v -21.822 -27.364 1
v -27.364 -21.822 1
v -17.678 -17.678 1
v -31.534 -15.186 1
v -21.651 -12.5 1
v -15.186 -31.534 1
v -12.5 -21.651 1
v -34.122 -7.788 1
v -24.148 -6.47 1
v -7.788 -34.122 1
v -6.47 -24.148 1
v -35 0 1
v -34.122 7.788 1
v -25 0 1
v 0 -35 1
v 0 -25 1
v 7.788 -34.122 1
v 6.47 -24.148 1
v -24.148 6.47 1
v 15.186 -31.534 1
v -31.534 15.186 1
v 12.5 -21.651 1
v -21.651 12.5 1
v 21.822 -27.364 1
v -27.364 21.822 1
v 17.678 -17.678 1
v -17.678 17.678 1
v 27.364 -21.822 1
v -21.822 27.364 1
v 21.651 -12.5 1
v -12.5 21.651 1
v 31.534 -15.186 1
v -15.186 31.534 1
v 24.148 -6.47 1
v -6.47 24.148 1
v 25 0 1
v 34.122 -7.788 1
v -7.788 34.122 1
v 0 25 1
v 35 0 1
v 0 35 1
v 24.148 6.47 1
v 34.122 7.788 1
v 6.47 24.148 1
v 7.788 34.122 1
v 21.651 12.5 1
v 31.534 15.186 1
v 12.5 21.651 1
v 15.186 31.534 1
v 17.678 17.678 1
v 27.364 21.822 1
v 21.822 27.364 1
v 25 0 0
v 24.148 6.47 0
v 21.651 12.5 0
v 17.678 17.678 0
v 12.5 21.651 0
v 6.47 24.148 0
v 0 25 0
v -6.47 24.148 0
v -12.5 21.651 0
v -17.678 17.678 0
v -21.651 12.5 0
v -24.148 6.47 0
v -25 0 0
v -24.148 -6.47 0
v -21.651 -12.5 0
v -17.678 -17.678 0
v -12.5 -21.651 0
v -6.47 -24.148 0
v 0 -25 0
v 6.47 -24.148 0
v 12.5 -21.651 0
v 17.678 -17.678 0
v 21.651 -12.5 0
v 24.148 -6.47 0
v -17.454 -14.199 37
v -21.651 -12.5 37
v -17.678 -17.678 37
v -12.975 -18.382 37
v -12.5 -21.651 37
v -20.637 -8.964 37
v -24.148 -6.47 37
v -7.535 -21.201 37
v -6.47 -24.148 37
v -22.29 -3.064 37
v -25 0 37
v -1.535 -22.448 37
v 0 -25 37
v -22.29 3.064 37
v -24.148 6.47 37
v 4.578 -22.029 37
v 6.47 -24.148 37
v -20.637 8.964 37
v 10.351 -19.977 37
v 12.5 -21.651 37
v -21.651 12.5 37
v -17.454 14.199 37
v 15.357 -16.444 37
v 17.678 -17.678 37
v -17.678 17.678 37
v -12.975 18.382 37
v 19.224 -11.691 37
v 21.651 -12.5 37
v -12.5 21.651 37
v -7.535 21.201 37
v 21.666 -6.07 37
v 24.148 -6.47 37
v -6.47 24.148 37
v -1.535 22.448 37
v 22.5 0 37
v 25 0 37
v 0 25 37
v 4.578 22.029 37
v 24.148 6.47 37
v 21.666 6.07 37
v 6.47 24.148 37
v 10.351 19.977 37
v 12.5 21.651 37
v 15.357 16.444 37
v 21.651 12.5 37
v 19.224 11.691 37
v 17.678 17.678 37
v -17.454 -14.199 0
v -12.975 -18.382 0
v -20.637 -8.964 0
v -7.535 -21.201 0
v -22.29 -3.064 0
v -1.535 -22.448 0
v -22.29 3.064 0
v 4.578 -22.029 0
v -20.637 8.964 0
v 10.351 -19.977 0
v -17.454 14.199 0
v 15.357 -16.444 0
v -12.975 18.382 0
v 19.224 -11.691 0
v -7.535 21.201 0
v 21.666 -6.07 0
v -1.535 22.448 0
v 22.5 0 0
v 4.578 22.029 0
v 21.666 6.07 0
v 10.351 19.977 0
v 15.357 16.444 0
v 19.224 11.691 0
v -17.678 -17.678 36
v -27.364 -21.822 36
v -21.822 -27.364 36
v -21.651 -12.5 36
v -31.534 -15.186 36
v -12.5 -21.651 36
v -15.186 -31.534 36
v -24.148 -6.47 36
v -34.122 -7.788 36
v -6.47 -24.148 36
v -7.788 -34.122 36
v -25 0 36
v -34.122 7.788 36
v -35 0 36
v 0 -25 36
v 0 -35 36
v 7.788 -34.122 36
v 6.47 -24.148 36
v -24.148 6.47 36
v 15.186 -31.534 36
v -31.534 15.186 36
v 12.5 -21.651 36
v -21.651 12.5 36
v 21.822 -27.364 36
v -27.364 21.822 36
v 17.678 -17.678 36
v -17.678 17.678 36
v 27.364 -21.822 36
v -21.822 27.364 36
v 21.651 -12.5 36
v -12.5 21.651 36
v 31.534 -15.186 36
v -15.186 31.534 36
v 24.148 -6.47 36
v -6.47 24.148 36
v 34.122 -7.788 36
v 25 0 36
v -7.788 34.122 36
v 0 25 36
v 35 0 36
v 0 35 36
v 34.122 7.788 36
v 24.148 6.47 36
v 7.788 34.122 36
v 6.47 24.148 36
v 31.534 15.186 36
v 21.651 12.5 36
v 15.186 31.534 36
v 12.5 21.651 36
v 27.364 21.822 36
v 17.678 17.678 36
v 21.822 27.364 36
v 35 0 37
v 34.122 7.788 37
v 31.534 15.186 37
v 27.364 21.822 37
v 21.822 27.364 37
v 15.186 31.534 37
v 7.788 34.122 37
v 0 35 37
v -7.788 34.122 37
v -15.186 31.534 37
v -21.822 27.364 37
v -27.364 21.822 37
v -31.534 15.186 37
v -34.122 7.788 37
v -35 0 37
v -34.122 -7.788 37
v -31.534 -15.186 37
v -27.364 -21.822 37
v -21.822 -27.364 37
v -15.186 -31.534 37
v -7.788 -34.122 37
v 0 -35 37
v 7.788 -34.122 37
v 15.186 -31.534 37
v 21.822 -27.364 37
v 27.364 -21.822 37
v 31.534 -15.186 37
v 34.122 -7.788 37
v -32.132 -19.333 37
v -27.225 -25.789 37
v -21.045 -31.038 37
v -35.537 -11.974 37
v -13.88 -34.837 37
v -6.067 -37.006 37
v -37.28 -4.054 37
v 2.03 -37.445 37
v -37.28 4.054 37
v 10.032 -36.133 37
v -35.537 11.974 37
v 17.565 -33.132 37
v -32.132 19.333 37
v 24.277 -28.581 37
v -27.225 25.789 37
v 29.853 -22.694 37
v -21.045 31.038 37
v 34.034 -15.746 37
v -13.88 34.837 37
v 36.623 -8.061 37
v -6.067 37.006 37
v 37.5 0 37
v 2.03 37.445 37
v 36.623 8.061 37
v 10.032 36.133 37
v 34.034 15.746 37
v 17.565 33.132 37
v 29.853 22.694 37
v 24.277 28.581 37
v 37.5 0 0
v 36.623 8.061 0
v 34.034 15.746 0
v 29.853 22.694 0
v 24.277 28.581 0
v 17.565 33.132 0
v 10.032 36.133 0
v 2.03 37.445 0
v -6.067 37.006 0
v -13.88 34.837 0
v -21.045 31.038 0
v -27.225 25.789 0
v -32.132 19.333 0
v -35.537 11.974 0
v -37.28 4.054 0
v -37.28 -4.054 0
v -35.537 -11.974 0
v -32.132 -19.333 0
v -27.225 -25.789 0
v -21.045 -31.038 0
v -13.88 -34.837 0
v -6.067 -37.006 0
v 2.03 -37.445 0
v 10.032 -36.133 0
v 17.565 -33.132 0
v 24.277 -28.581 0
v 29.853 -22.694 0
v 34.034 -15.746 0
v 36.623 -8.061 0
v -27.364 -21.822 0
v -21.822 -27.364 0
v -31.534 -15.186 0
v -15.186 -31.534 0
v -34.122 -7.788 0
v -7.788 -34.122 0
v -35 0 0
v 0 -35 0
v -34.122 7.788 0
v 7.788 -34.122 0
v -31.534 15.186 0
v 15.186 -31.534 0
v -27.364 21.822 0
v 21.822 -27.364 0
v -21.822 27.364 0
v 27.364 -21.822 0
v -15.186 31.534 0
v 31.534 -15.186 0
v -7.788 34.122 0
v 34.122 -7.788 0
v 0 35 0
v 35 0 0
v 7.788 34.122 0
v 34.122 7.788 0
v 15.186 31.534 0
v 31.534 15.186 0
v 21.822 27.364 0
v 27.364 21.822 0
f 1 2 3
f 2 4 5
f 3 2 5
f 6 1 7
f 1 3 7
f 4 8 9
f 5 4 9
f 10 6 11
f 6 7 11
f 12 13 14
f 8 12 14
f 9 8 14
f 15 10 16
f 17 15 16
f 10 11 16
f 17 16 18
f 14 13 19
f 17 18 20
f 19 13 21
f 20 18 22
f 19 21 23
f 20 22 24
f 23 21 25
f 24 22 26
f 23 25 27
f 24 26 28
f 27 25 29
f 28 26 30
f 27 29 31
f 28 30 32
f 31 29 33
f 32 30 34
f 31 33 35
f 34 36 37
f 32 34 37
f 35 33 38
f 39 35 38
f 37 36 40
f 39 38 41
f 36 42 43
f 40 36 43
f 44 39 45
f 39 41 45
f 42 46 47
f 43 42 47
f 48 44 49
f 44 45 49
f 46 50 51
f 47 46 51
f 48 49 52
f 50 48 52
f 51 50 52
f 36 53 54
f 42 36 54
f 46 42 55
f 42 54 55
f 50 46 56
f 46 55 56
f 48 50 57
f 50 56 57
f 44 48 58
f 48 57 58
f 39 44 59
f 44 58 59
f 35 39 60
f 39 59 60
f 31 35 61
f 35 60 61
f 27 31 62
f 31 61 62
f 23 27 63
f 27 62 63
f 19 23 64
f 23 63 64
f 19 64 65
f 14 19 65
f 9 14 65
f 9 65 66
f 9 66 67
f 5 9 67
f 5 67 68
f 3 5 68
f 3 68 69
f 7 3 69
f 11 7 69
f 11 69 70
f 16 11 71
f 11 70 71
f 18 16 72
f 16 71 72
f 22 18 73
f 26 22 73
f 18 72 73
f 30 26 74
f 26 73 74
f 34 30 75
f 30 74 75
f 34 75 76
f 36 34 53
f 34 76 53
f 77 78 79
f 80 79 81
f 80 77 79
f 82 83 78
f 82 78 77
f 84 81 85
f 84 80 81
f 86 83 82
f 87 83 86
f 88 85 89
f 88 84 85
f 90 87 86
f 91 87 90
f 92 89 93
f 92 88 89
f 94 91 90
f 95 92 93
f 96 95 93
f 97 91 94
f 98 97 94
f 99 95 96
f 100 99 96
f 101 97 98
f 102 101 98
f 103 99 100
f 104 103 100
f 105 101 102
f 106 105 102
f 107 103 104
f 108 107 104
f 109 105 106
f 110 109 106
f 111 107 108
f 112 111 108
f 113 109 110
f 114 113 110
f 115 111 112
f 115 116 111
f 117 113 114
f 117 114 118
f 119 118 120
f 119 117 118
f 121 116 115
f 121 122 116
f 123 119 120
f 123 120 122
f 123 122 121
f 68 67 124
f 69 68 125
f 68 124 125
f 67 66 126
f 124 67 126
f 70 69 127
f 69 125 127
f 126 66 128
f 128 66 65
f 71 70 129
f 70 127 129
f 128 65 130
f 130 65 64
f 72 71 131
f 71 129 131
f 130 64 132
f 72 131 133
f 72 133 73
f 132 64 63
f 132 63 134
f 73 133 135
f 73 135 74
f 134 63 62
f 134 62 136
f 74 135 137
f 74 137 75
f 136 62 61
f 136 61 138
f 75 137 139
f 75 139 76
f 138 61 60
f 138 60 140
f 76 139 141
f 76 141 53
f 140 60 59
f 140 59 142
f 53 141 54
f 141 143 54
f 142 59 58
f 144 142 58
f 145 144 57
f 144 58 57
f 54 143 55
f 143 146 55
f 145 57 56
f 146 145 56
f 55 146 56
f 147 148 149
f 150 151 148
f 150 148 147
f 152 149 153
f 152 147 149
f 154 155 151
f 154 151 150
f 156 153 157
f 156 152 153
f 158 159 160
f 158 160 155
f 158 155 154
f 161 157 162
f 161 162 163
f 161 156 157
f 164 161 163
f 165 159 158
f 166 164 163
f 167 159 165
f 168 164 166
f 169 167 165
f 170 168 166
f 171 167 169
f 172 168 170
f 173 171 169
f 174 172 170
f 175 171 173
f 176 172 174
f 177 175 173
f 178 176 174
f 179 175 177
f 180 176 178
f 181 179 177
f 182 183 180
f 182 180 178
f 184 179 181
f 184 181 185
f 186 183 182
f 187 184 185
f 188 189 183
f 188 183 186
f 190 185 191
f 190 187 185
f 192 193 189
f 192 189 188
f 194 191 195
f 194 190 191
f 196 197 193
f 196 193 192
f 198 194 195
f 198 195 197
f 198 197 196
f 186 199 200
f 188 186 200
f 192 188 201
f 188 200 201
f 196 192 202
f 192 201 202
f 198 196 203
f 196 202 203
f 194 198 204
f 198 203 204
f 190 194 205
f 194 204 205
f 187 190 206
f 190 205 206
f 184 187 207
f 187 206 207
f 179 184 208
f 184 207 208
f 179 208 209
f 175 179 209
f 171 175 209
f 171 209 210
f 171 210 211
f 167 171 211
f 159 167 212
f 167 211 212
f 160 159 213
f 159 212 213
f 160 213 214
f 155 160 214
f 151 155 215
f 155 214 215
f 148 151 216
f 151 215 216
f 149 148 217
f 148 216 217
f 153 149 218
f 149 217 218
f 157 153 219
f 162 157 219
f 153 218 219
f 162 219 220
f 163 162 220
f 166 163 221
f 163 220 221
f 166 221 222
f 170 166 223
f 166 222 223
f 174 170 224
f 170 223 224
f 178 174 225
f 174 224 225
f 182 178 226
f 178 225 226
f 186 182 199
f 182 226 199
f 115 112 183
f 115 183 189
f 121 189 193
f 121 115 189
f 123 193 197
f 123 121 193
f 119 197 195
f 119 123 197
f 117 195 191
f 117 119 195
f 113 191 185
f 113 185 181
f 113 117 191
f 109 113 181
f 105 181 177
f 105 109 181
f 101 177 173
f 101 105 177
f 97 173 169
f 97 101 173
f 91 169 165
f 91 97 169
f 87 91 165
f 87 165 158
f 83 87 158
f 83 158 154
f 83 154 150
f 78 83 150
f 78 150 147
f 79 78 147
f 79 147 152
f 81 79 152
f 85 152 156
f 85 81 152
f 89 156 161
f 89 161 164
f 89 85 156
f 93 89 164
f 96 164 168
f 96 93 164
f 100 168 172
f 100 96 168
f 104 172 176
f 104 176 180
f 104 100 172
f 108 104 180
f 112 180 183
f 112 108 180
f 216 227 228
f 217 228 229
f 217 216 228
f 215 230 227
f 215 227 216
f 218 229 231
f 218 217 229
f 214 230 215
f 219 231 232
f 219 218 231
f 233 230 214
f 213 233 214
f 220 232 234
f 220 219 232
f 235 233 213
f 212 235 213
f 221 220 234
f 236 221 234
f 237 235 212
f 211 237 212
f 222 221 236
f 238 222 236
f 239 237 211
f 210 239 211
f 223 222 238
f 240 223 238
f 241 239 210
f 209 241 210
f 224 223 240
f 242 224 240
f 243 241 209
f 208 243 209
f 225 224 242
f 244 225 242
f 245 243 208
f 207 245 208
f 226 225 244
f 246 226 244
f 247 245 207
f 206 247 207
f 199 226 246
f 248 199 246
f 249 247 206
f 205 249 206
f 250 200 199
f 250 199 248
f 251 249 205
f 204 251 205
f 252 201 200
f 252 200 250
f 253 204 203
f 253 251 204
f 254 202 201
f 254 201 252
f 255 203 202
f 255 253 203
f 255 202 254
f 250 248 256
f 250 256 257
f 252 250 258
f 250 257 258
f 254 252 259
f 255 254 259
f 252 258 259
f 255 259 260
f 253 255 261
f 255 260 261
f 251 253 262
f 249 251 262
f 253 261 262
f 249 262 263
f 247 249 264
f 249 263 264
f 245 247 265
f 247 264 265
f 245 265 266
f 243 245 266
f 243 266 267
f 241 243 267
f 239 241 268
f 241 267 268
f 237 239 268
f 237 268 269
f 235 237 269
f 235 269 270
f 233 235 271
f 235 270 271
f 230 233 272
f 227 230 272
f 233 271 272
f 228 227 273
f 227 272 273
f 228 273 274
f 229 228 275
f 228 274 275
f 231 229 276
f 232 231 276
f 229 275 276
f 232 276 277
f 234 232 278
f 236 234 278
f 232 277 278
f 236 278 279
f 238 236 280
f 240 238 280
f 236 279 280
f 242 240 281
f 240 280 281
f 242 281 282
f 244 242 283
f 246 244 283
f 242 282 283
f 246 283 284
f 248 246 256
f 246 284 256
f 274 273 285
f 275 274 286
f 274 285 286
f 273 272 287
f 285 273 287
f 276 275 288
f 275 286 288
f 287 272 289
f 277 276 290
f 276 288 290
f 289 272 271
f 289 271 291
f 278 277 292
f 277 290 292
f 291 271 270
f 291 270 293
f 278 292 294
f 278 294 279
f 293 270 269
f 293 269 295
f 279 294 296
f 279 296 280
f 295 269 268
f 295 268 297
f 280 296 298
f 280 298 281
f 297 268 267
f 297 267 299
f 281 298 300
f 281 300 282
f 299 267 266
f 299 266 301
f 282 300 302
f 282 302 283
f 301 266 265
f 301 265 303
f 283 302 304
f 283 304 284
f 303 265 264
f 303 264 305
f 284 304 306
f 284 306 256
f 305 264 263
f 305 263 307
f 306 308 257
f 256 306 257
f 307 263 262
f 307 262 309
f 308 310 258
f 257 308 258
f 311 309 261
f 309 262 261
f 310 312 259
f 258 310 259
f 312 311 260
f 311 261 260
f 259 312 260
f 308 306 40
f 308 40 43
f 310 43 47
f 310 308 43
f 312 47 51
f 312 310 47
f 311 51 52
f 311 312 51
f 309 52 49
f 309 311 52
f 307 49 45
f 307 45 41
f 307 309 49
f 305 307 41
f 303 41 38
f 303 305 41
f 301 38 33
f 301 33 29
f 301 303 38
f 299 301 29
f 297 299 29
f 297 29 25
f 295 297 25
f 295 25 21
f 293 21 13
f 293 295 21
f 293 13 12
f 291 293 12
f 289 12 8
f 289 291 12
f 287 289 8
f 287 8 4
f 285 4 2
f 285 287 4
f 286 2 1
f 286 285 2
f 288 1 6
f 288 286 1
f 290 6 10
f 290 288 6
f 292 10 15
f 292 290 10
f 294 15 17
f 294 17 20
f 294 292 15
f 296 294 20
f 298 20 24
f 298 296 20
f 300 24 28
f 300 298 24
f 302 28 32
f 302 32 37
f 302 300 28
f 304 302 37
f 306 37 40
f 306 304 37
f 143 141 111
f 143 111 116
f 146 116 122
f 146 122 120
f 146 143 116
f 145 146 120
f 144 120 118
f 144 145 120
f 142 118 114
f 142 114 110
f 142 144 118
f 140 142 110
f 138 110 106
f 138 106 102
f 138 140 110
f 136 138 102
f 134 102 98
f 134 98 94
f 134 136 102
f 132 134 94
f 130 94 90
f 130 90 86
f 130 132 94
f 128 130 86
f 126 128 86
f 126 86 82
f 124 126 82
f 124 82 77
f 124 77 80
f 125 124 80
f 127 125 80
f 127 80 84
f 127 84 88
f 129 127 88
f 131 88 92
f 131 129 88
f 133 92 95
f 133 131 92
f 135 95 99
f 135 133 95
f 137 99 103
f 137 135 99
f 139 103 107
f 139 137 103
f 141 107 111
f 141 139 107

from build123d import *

# Parameters (mm, degrees)
SZKIC1_R                    = 37.5
SZKIC1_R_2                  = 22.5
DODANIE_WYCI_GNI_CIE1_DEPTH = 37
SZKIC2_R                    = 35
SZKIC2_R_2                  = 25
WYTNIJ_WYCI_GNI_CIE1_DEPTH  = 1


with BuildPart() as part:
    # Szkic1 → Dodanie-wyciągnięcie1 (new body)
    with BuildSketch(Plane.XY):
        Circle(SZKIC1_R)
        Circle(SZKIC1_R_2, mode=Mode.SUBTRACT)
    extrude(amount=DODANIE_WYCI_GNI_CIE1_DEPTH)

    # Szkic2 → Wytnij-wyciągnięcie1 (cut)
    with BuildSketch(Plane.XY.offset(37)):
        Circle(SZKIC2_R)
        Circle(SZKIC2_R_2, mode=Mode.SUBTRACT)
    wytnij_wyci_gni_cie1 = extrude(amount=-WYTNIJ_WYCI_GNI_CIE1_DEPTH, mode=Mode.SUBTRACT)

    # Lustro1: Wytnij-wyciągnięcie1 across plane
    add(wytnij_wyci_gni_cie1.mirror(Plane.XY.offset(18.5)), mode=Mode.SUBTRACT)


solid = part.part
